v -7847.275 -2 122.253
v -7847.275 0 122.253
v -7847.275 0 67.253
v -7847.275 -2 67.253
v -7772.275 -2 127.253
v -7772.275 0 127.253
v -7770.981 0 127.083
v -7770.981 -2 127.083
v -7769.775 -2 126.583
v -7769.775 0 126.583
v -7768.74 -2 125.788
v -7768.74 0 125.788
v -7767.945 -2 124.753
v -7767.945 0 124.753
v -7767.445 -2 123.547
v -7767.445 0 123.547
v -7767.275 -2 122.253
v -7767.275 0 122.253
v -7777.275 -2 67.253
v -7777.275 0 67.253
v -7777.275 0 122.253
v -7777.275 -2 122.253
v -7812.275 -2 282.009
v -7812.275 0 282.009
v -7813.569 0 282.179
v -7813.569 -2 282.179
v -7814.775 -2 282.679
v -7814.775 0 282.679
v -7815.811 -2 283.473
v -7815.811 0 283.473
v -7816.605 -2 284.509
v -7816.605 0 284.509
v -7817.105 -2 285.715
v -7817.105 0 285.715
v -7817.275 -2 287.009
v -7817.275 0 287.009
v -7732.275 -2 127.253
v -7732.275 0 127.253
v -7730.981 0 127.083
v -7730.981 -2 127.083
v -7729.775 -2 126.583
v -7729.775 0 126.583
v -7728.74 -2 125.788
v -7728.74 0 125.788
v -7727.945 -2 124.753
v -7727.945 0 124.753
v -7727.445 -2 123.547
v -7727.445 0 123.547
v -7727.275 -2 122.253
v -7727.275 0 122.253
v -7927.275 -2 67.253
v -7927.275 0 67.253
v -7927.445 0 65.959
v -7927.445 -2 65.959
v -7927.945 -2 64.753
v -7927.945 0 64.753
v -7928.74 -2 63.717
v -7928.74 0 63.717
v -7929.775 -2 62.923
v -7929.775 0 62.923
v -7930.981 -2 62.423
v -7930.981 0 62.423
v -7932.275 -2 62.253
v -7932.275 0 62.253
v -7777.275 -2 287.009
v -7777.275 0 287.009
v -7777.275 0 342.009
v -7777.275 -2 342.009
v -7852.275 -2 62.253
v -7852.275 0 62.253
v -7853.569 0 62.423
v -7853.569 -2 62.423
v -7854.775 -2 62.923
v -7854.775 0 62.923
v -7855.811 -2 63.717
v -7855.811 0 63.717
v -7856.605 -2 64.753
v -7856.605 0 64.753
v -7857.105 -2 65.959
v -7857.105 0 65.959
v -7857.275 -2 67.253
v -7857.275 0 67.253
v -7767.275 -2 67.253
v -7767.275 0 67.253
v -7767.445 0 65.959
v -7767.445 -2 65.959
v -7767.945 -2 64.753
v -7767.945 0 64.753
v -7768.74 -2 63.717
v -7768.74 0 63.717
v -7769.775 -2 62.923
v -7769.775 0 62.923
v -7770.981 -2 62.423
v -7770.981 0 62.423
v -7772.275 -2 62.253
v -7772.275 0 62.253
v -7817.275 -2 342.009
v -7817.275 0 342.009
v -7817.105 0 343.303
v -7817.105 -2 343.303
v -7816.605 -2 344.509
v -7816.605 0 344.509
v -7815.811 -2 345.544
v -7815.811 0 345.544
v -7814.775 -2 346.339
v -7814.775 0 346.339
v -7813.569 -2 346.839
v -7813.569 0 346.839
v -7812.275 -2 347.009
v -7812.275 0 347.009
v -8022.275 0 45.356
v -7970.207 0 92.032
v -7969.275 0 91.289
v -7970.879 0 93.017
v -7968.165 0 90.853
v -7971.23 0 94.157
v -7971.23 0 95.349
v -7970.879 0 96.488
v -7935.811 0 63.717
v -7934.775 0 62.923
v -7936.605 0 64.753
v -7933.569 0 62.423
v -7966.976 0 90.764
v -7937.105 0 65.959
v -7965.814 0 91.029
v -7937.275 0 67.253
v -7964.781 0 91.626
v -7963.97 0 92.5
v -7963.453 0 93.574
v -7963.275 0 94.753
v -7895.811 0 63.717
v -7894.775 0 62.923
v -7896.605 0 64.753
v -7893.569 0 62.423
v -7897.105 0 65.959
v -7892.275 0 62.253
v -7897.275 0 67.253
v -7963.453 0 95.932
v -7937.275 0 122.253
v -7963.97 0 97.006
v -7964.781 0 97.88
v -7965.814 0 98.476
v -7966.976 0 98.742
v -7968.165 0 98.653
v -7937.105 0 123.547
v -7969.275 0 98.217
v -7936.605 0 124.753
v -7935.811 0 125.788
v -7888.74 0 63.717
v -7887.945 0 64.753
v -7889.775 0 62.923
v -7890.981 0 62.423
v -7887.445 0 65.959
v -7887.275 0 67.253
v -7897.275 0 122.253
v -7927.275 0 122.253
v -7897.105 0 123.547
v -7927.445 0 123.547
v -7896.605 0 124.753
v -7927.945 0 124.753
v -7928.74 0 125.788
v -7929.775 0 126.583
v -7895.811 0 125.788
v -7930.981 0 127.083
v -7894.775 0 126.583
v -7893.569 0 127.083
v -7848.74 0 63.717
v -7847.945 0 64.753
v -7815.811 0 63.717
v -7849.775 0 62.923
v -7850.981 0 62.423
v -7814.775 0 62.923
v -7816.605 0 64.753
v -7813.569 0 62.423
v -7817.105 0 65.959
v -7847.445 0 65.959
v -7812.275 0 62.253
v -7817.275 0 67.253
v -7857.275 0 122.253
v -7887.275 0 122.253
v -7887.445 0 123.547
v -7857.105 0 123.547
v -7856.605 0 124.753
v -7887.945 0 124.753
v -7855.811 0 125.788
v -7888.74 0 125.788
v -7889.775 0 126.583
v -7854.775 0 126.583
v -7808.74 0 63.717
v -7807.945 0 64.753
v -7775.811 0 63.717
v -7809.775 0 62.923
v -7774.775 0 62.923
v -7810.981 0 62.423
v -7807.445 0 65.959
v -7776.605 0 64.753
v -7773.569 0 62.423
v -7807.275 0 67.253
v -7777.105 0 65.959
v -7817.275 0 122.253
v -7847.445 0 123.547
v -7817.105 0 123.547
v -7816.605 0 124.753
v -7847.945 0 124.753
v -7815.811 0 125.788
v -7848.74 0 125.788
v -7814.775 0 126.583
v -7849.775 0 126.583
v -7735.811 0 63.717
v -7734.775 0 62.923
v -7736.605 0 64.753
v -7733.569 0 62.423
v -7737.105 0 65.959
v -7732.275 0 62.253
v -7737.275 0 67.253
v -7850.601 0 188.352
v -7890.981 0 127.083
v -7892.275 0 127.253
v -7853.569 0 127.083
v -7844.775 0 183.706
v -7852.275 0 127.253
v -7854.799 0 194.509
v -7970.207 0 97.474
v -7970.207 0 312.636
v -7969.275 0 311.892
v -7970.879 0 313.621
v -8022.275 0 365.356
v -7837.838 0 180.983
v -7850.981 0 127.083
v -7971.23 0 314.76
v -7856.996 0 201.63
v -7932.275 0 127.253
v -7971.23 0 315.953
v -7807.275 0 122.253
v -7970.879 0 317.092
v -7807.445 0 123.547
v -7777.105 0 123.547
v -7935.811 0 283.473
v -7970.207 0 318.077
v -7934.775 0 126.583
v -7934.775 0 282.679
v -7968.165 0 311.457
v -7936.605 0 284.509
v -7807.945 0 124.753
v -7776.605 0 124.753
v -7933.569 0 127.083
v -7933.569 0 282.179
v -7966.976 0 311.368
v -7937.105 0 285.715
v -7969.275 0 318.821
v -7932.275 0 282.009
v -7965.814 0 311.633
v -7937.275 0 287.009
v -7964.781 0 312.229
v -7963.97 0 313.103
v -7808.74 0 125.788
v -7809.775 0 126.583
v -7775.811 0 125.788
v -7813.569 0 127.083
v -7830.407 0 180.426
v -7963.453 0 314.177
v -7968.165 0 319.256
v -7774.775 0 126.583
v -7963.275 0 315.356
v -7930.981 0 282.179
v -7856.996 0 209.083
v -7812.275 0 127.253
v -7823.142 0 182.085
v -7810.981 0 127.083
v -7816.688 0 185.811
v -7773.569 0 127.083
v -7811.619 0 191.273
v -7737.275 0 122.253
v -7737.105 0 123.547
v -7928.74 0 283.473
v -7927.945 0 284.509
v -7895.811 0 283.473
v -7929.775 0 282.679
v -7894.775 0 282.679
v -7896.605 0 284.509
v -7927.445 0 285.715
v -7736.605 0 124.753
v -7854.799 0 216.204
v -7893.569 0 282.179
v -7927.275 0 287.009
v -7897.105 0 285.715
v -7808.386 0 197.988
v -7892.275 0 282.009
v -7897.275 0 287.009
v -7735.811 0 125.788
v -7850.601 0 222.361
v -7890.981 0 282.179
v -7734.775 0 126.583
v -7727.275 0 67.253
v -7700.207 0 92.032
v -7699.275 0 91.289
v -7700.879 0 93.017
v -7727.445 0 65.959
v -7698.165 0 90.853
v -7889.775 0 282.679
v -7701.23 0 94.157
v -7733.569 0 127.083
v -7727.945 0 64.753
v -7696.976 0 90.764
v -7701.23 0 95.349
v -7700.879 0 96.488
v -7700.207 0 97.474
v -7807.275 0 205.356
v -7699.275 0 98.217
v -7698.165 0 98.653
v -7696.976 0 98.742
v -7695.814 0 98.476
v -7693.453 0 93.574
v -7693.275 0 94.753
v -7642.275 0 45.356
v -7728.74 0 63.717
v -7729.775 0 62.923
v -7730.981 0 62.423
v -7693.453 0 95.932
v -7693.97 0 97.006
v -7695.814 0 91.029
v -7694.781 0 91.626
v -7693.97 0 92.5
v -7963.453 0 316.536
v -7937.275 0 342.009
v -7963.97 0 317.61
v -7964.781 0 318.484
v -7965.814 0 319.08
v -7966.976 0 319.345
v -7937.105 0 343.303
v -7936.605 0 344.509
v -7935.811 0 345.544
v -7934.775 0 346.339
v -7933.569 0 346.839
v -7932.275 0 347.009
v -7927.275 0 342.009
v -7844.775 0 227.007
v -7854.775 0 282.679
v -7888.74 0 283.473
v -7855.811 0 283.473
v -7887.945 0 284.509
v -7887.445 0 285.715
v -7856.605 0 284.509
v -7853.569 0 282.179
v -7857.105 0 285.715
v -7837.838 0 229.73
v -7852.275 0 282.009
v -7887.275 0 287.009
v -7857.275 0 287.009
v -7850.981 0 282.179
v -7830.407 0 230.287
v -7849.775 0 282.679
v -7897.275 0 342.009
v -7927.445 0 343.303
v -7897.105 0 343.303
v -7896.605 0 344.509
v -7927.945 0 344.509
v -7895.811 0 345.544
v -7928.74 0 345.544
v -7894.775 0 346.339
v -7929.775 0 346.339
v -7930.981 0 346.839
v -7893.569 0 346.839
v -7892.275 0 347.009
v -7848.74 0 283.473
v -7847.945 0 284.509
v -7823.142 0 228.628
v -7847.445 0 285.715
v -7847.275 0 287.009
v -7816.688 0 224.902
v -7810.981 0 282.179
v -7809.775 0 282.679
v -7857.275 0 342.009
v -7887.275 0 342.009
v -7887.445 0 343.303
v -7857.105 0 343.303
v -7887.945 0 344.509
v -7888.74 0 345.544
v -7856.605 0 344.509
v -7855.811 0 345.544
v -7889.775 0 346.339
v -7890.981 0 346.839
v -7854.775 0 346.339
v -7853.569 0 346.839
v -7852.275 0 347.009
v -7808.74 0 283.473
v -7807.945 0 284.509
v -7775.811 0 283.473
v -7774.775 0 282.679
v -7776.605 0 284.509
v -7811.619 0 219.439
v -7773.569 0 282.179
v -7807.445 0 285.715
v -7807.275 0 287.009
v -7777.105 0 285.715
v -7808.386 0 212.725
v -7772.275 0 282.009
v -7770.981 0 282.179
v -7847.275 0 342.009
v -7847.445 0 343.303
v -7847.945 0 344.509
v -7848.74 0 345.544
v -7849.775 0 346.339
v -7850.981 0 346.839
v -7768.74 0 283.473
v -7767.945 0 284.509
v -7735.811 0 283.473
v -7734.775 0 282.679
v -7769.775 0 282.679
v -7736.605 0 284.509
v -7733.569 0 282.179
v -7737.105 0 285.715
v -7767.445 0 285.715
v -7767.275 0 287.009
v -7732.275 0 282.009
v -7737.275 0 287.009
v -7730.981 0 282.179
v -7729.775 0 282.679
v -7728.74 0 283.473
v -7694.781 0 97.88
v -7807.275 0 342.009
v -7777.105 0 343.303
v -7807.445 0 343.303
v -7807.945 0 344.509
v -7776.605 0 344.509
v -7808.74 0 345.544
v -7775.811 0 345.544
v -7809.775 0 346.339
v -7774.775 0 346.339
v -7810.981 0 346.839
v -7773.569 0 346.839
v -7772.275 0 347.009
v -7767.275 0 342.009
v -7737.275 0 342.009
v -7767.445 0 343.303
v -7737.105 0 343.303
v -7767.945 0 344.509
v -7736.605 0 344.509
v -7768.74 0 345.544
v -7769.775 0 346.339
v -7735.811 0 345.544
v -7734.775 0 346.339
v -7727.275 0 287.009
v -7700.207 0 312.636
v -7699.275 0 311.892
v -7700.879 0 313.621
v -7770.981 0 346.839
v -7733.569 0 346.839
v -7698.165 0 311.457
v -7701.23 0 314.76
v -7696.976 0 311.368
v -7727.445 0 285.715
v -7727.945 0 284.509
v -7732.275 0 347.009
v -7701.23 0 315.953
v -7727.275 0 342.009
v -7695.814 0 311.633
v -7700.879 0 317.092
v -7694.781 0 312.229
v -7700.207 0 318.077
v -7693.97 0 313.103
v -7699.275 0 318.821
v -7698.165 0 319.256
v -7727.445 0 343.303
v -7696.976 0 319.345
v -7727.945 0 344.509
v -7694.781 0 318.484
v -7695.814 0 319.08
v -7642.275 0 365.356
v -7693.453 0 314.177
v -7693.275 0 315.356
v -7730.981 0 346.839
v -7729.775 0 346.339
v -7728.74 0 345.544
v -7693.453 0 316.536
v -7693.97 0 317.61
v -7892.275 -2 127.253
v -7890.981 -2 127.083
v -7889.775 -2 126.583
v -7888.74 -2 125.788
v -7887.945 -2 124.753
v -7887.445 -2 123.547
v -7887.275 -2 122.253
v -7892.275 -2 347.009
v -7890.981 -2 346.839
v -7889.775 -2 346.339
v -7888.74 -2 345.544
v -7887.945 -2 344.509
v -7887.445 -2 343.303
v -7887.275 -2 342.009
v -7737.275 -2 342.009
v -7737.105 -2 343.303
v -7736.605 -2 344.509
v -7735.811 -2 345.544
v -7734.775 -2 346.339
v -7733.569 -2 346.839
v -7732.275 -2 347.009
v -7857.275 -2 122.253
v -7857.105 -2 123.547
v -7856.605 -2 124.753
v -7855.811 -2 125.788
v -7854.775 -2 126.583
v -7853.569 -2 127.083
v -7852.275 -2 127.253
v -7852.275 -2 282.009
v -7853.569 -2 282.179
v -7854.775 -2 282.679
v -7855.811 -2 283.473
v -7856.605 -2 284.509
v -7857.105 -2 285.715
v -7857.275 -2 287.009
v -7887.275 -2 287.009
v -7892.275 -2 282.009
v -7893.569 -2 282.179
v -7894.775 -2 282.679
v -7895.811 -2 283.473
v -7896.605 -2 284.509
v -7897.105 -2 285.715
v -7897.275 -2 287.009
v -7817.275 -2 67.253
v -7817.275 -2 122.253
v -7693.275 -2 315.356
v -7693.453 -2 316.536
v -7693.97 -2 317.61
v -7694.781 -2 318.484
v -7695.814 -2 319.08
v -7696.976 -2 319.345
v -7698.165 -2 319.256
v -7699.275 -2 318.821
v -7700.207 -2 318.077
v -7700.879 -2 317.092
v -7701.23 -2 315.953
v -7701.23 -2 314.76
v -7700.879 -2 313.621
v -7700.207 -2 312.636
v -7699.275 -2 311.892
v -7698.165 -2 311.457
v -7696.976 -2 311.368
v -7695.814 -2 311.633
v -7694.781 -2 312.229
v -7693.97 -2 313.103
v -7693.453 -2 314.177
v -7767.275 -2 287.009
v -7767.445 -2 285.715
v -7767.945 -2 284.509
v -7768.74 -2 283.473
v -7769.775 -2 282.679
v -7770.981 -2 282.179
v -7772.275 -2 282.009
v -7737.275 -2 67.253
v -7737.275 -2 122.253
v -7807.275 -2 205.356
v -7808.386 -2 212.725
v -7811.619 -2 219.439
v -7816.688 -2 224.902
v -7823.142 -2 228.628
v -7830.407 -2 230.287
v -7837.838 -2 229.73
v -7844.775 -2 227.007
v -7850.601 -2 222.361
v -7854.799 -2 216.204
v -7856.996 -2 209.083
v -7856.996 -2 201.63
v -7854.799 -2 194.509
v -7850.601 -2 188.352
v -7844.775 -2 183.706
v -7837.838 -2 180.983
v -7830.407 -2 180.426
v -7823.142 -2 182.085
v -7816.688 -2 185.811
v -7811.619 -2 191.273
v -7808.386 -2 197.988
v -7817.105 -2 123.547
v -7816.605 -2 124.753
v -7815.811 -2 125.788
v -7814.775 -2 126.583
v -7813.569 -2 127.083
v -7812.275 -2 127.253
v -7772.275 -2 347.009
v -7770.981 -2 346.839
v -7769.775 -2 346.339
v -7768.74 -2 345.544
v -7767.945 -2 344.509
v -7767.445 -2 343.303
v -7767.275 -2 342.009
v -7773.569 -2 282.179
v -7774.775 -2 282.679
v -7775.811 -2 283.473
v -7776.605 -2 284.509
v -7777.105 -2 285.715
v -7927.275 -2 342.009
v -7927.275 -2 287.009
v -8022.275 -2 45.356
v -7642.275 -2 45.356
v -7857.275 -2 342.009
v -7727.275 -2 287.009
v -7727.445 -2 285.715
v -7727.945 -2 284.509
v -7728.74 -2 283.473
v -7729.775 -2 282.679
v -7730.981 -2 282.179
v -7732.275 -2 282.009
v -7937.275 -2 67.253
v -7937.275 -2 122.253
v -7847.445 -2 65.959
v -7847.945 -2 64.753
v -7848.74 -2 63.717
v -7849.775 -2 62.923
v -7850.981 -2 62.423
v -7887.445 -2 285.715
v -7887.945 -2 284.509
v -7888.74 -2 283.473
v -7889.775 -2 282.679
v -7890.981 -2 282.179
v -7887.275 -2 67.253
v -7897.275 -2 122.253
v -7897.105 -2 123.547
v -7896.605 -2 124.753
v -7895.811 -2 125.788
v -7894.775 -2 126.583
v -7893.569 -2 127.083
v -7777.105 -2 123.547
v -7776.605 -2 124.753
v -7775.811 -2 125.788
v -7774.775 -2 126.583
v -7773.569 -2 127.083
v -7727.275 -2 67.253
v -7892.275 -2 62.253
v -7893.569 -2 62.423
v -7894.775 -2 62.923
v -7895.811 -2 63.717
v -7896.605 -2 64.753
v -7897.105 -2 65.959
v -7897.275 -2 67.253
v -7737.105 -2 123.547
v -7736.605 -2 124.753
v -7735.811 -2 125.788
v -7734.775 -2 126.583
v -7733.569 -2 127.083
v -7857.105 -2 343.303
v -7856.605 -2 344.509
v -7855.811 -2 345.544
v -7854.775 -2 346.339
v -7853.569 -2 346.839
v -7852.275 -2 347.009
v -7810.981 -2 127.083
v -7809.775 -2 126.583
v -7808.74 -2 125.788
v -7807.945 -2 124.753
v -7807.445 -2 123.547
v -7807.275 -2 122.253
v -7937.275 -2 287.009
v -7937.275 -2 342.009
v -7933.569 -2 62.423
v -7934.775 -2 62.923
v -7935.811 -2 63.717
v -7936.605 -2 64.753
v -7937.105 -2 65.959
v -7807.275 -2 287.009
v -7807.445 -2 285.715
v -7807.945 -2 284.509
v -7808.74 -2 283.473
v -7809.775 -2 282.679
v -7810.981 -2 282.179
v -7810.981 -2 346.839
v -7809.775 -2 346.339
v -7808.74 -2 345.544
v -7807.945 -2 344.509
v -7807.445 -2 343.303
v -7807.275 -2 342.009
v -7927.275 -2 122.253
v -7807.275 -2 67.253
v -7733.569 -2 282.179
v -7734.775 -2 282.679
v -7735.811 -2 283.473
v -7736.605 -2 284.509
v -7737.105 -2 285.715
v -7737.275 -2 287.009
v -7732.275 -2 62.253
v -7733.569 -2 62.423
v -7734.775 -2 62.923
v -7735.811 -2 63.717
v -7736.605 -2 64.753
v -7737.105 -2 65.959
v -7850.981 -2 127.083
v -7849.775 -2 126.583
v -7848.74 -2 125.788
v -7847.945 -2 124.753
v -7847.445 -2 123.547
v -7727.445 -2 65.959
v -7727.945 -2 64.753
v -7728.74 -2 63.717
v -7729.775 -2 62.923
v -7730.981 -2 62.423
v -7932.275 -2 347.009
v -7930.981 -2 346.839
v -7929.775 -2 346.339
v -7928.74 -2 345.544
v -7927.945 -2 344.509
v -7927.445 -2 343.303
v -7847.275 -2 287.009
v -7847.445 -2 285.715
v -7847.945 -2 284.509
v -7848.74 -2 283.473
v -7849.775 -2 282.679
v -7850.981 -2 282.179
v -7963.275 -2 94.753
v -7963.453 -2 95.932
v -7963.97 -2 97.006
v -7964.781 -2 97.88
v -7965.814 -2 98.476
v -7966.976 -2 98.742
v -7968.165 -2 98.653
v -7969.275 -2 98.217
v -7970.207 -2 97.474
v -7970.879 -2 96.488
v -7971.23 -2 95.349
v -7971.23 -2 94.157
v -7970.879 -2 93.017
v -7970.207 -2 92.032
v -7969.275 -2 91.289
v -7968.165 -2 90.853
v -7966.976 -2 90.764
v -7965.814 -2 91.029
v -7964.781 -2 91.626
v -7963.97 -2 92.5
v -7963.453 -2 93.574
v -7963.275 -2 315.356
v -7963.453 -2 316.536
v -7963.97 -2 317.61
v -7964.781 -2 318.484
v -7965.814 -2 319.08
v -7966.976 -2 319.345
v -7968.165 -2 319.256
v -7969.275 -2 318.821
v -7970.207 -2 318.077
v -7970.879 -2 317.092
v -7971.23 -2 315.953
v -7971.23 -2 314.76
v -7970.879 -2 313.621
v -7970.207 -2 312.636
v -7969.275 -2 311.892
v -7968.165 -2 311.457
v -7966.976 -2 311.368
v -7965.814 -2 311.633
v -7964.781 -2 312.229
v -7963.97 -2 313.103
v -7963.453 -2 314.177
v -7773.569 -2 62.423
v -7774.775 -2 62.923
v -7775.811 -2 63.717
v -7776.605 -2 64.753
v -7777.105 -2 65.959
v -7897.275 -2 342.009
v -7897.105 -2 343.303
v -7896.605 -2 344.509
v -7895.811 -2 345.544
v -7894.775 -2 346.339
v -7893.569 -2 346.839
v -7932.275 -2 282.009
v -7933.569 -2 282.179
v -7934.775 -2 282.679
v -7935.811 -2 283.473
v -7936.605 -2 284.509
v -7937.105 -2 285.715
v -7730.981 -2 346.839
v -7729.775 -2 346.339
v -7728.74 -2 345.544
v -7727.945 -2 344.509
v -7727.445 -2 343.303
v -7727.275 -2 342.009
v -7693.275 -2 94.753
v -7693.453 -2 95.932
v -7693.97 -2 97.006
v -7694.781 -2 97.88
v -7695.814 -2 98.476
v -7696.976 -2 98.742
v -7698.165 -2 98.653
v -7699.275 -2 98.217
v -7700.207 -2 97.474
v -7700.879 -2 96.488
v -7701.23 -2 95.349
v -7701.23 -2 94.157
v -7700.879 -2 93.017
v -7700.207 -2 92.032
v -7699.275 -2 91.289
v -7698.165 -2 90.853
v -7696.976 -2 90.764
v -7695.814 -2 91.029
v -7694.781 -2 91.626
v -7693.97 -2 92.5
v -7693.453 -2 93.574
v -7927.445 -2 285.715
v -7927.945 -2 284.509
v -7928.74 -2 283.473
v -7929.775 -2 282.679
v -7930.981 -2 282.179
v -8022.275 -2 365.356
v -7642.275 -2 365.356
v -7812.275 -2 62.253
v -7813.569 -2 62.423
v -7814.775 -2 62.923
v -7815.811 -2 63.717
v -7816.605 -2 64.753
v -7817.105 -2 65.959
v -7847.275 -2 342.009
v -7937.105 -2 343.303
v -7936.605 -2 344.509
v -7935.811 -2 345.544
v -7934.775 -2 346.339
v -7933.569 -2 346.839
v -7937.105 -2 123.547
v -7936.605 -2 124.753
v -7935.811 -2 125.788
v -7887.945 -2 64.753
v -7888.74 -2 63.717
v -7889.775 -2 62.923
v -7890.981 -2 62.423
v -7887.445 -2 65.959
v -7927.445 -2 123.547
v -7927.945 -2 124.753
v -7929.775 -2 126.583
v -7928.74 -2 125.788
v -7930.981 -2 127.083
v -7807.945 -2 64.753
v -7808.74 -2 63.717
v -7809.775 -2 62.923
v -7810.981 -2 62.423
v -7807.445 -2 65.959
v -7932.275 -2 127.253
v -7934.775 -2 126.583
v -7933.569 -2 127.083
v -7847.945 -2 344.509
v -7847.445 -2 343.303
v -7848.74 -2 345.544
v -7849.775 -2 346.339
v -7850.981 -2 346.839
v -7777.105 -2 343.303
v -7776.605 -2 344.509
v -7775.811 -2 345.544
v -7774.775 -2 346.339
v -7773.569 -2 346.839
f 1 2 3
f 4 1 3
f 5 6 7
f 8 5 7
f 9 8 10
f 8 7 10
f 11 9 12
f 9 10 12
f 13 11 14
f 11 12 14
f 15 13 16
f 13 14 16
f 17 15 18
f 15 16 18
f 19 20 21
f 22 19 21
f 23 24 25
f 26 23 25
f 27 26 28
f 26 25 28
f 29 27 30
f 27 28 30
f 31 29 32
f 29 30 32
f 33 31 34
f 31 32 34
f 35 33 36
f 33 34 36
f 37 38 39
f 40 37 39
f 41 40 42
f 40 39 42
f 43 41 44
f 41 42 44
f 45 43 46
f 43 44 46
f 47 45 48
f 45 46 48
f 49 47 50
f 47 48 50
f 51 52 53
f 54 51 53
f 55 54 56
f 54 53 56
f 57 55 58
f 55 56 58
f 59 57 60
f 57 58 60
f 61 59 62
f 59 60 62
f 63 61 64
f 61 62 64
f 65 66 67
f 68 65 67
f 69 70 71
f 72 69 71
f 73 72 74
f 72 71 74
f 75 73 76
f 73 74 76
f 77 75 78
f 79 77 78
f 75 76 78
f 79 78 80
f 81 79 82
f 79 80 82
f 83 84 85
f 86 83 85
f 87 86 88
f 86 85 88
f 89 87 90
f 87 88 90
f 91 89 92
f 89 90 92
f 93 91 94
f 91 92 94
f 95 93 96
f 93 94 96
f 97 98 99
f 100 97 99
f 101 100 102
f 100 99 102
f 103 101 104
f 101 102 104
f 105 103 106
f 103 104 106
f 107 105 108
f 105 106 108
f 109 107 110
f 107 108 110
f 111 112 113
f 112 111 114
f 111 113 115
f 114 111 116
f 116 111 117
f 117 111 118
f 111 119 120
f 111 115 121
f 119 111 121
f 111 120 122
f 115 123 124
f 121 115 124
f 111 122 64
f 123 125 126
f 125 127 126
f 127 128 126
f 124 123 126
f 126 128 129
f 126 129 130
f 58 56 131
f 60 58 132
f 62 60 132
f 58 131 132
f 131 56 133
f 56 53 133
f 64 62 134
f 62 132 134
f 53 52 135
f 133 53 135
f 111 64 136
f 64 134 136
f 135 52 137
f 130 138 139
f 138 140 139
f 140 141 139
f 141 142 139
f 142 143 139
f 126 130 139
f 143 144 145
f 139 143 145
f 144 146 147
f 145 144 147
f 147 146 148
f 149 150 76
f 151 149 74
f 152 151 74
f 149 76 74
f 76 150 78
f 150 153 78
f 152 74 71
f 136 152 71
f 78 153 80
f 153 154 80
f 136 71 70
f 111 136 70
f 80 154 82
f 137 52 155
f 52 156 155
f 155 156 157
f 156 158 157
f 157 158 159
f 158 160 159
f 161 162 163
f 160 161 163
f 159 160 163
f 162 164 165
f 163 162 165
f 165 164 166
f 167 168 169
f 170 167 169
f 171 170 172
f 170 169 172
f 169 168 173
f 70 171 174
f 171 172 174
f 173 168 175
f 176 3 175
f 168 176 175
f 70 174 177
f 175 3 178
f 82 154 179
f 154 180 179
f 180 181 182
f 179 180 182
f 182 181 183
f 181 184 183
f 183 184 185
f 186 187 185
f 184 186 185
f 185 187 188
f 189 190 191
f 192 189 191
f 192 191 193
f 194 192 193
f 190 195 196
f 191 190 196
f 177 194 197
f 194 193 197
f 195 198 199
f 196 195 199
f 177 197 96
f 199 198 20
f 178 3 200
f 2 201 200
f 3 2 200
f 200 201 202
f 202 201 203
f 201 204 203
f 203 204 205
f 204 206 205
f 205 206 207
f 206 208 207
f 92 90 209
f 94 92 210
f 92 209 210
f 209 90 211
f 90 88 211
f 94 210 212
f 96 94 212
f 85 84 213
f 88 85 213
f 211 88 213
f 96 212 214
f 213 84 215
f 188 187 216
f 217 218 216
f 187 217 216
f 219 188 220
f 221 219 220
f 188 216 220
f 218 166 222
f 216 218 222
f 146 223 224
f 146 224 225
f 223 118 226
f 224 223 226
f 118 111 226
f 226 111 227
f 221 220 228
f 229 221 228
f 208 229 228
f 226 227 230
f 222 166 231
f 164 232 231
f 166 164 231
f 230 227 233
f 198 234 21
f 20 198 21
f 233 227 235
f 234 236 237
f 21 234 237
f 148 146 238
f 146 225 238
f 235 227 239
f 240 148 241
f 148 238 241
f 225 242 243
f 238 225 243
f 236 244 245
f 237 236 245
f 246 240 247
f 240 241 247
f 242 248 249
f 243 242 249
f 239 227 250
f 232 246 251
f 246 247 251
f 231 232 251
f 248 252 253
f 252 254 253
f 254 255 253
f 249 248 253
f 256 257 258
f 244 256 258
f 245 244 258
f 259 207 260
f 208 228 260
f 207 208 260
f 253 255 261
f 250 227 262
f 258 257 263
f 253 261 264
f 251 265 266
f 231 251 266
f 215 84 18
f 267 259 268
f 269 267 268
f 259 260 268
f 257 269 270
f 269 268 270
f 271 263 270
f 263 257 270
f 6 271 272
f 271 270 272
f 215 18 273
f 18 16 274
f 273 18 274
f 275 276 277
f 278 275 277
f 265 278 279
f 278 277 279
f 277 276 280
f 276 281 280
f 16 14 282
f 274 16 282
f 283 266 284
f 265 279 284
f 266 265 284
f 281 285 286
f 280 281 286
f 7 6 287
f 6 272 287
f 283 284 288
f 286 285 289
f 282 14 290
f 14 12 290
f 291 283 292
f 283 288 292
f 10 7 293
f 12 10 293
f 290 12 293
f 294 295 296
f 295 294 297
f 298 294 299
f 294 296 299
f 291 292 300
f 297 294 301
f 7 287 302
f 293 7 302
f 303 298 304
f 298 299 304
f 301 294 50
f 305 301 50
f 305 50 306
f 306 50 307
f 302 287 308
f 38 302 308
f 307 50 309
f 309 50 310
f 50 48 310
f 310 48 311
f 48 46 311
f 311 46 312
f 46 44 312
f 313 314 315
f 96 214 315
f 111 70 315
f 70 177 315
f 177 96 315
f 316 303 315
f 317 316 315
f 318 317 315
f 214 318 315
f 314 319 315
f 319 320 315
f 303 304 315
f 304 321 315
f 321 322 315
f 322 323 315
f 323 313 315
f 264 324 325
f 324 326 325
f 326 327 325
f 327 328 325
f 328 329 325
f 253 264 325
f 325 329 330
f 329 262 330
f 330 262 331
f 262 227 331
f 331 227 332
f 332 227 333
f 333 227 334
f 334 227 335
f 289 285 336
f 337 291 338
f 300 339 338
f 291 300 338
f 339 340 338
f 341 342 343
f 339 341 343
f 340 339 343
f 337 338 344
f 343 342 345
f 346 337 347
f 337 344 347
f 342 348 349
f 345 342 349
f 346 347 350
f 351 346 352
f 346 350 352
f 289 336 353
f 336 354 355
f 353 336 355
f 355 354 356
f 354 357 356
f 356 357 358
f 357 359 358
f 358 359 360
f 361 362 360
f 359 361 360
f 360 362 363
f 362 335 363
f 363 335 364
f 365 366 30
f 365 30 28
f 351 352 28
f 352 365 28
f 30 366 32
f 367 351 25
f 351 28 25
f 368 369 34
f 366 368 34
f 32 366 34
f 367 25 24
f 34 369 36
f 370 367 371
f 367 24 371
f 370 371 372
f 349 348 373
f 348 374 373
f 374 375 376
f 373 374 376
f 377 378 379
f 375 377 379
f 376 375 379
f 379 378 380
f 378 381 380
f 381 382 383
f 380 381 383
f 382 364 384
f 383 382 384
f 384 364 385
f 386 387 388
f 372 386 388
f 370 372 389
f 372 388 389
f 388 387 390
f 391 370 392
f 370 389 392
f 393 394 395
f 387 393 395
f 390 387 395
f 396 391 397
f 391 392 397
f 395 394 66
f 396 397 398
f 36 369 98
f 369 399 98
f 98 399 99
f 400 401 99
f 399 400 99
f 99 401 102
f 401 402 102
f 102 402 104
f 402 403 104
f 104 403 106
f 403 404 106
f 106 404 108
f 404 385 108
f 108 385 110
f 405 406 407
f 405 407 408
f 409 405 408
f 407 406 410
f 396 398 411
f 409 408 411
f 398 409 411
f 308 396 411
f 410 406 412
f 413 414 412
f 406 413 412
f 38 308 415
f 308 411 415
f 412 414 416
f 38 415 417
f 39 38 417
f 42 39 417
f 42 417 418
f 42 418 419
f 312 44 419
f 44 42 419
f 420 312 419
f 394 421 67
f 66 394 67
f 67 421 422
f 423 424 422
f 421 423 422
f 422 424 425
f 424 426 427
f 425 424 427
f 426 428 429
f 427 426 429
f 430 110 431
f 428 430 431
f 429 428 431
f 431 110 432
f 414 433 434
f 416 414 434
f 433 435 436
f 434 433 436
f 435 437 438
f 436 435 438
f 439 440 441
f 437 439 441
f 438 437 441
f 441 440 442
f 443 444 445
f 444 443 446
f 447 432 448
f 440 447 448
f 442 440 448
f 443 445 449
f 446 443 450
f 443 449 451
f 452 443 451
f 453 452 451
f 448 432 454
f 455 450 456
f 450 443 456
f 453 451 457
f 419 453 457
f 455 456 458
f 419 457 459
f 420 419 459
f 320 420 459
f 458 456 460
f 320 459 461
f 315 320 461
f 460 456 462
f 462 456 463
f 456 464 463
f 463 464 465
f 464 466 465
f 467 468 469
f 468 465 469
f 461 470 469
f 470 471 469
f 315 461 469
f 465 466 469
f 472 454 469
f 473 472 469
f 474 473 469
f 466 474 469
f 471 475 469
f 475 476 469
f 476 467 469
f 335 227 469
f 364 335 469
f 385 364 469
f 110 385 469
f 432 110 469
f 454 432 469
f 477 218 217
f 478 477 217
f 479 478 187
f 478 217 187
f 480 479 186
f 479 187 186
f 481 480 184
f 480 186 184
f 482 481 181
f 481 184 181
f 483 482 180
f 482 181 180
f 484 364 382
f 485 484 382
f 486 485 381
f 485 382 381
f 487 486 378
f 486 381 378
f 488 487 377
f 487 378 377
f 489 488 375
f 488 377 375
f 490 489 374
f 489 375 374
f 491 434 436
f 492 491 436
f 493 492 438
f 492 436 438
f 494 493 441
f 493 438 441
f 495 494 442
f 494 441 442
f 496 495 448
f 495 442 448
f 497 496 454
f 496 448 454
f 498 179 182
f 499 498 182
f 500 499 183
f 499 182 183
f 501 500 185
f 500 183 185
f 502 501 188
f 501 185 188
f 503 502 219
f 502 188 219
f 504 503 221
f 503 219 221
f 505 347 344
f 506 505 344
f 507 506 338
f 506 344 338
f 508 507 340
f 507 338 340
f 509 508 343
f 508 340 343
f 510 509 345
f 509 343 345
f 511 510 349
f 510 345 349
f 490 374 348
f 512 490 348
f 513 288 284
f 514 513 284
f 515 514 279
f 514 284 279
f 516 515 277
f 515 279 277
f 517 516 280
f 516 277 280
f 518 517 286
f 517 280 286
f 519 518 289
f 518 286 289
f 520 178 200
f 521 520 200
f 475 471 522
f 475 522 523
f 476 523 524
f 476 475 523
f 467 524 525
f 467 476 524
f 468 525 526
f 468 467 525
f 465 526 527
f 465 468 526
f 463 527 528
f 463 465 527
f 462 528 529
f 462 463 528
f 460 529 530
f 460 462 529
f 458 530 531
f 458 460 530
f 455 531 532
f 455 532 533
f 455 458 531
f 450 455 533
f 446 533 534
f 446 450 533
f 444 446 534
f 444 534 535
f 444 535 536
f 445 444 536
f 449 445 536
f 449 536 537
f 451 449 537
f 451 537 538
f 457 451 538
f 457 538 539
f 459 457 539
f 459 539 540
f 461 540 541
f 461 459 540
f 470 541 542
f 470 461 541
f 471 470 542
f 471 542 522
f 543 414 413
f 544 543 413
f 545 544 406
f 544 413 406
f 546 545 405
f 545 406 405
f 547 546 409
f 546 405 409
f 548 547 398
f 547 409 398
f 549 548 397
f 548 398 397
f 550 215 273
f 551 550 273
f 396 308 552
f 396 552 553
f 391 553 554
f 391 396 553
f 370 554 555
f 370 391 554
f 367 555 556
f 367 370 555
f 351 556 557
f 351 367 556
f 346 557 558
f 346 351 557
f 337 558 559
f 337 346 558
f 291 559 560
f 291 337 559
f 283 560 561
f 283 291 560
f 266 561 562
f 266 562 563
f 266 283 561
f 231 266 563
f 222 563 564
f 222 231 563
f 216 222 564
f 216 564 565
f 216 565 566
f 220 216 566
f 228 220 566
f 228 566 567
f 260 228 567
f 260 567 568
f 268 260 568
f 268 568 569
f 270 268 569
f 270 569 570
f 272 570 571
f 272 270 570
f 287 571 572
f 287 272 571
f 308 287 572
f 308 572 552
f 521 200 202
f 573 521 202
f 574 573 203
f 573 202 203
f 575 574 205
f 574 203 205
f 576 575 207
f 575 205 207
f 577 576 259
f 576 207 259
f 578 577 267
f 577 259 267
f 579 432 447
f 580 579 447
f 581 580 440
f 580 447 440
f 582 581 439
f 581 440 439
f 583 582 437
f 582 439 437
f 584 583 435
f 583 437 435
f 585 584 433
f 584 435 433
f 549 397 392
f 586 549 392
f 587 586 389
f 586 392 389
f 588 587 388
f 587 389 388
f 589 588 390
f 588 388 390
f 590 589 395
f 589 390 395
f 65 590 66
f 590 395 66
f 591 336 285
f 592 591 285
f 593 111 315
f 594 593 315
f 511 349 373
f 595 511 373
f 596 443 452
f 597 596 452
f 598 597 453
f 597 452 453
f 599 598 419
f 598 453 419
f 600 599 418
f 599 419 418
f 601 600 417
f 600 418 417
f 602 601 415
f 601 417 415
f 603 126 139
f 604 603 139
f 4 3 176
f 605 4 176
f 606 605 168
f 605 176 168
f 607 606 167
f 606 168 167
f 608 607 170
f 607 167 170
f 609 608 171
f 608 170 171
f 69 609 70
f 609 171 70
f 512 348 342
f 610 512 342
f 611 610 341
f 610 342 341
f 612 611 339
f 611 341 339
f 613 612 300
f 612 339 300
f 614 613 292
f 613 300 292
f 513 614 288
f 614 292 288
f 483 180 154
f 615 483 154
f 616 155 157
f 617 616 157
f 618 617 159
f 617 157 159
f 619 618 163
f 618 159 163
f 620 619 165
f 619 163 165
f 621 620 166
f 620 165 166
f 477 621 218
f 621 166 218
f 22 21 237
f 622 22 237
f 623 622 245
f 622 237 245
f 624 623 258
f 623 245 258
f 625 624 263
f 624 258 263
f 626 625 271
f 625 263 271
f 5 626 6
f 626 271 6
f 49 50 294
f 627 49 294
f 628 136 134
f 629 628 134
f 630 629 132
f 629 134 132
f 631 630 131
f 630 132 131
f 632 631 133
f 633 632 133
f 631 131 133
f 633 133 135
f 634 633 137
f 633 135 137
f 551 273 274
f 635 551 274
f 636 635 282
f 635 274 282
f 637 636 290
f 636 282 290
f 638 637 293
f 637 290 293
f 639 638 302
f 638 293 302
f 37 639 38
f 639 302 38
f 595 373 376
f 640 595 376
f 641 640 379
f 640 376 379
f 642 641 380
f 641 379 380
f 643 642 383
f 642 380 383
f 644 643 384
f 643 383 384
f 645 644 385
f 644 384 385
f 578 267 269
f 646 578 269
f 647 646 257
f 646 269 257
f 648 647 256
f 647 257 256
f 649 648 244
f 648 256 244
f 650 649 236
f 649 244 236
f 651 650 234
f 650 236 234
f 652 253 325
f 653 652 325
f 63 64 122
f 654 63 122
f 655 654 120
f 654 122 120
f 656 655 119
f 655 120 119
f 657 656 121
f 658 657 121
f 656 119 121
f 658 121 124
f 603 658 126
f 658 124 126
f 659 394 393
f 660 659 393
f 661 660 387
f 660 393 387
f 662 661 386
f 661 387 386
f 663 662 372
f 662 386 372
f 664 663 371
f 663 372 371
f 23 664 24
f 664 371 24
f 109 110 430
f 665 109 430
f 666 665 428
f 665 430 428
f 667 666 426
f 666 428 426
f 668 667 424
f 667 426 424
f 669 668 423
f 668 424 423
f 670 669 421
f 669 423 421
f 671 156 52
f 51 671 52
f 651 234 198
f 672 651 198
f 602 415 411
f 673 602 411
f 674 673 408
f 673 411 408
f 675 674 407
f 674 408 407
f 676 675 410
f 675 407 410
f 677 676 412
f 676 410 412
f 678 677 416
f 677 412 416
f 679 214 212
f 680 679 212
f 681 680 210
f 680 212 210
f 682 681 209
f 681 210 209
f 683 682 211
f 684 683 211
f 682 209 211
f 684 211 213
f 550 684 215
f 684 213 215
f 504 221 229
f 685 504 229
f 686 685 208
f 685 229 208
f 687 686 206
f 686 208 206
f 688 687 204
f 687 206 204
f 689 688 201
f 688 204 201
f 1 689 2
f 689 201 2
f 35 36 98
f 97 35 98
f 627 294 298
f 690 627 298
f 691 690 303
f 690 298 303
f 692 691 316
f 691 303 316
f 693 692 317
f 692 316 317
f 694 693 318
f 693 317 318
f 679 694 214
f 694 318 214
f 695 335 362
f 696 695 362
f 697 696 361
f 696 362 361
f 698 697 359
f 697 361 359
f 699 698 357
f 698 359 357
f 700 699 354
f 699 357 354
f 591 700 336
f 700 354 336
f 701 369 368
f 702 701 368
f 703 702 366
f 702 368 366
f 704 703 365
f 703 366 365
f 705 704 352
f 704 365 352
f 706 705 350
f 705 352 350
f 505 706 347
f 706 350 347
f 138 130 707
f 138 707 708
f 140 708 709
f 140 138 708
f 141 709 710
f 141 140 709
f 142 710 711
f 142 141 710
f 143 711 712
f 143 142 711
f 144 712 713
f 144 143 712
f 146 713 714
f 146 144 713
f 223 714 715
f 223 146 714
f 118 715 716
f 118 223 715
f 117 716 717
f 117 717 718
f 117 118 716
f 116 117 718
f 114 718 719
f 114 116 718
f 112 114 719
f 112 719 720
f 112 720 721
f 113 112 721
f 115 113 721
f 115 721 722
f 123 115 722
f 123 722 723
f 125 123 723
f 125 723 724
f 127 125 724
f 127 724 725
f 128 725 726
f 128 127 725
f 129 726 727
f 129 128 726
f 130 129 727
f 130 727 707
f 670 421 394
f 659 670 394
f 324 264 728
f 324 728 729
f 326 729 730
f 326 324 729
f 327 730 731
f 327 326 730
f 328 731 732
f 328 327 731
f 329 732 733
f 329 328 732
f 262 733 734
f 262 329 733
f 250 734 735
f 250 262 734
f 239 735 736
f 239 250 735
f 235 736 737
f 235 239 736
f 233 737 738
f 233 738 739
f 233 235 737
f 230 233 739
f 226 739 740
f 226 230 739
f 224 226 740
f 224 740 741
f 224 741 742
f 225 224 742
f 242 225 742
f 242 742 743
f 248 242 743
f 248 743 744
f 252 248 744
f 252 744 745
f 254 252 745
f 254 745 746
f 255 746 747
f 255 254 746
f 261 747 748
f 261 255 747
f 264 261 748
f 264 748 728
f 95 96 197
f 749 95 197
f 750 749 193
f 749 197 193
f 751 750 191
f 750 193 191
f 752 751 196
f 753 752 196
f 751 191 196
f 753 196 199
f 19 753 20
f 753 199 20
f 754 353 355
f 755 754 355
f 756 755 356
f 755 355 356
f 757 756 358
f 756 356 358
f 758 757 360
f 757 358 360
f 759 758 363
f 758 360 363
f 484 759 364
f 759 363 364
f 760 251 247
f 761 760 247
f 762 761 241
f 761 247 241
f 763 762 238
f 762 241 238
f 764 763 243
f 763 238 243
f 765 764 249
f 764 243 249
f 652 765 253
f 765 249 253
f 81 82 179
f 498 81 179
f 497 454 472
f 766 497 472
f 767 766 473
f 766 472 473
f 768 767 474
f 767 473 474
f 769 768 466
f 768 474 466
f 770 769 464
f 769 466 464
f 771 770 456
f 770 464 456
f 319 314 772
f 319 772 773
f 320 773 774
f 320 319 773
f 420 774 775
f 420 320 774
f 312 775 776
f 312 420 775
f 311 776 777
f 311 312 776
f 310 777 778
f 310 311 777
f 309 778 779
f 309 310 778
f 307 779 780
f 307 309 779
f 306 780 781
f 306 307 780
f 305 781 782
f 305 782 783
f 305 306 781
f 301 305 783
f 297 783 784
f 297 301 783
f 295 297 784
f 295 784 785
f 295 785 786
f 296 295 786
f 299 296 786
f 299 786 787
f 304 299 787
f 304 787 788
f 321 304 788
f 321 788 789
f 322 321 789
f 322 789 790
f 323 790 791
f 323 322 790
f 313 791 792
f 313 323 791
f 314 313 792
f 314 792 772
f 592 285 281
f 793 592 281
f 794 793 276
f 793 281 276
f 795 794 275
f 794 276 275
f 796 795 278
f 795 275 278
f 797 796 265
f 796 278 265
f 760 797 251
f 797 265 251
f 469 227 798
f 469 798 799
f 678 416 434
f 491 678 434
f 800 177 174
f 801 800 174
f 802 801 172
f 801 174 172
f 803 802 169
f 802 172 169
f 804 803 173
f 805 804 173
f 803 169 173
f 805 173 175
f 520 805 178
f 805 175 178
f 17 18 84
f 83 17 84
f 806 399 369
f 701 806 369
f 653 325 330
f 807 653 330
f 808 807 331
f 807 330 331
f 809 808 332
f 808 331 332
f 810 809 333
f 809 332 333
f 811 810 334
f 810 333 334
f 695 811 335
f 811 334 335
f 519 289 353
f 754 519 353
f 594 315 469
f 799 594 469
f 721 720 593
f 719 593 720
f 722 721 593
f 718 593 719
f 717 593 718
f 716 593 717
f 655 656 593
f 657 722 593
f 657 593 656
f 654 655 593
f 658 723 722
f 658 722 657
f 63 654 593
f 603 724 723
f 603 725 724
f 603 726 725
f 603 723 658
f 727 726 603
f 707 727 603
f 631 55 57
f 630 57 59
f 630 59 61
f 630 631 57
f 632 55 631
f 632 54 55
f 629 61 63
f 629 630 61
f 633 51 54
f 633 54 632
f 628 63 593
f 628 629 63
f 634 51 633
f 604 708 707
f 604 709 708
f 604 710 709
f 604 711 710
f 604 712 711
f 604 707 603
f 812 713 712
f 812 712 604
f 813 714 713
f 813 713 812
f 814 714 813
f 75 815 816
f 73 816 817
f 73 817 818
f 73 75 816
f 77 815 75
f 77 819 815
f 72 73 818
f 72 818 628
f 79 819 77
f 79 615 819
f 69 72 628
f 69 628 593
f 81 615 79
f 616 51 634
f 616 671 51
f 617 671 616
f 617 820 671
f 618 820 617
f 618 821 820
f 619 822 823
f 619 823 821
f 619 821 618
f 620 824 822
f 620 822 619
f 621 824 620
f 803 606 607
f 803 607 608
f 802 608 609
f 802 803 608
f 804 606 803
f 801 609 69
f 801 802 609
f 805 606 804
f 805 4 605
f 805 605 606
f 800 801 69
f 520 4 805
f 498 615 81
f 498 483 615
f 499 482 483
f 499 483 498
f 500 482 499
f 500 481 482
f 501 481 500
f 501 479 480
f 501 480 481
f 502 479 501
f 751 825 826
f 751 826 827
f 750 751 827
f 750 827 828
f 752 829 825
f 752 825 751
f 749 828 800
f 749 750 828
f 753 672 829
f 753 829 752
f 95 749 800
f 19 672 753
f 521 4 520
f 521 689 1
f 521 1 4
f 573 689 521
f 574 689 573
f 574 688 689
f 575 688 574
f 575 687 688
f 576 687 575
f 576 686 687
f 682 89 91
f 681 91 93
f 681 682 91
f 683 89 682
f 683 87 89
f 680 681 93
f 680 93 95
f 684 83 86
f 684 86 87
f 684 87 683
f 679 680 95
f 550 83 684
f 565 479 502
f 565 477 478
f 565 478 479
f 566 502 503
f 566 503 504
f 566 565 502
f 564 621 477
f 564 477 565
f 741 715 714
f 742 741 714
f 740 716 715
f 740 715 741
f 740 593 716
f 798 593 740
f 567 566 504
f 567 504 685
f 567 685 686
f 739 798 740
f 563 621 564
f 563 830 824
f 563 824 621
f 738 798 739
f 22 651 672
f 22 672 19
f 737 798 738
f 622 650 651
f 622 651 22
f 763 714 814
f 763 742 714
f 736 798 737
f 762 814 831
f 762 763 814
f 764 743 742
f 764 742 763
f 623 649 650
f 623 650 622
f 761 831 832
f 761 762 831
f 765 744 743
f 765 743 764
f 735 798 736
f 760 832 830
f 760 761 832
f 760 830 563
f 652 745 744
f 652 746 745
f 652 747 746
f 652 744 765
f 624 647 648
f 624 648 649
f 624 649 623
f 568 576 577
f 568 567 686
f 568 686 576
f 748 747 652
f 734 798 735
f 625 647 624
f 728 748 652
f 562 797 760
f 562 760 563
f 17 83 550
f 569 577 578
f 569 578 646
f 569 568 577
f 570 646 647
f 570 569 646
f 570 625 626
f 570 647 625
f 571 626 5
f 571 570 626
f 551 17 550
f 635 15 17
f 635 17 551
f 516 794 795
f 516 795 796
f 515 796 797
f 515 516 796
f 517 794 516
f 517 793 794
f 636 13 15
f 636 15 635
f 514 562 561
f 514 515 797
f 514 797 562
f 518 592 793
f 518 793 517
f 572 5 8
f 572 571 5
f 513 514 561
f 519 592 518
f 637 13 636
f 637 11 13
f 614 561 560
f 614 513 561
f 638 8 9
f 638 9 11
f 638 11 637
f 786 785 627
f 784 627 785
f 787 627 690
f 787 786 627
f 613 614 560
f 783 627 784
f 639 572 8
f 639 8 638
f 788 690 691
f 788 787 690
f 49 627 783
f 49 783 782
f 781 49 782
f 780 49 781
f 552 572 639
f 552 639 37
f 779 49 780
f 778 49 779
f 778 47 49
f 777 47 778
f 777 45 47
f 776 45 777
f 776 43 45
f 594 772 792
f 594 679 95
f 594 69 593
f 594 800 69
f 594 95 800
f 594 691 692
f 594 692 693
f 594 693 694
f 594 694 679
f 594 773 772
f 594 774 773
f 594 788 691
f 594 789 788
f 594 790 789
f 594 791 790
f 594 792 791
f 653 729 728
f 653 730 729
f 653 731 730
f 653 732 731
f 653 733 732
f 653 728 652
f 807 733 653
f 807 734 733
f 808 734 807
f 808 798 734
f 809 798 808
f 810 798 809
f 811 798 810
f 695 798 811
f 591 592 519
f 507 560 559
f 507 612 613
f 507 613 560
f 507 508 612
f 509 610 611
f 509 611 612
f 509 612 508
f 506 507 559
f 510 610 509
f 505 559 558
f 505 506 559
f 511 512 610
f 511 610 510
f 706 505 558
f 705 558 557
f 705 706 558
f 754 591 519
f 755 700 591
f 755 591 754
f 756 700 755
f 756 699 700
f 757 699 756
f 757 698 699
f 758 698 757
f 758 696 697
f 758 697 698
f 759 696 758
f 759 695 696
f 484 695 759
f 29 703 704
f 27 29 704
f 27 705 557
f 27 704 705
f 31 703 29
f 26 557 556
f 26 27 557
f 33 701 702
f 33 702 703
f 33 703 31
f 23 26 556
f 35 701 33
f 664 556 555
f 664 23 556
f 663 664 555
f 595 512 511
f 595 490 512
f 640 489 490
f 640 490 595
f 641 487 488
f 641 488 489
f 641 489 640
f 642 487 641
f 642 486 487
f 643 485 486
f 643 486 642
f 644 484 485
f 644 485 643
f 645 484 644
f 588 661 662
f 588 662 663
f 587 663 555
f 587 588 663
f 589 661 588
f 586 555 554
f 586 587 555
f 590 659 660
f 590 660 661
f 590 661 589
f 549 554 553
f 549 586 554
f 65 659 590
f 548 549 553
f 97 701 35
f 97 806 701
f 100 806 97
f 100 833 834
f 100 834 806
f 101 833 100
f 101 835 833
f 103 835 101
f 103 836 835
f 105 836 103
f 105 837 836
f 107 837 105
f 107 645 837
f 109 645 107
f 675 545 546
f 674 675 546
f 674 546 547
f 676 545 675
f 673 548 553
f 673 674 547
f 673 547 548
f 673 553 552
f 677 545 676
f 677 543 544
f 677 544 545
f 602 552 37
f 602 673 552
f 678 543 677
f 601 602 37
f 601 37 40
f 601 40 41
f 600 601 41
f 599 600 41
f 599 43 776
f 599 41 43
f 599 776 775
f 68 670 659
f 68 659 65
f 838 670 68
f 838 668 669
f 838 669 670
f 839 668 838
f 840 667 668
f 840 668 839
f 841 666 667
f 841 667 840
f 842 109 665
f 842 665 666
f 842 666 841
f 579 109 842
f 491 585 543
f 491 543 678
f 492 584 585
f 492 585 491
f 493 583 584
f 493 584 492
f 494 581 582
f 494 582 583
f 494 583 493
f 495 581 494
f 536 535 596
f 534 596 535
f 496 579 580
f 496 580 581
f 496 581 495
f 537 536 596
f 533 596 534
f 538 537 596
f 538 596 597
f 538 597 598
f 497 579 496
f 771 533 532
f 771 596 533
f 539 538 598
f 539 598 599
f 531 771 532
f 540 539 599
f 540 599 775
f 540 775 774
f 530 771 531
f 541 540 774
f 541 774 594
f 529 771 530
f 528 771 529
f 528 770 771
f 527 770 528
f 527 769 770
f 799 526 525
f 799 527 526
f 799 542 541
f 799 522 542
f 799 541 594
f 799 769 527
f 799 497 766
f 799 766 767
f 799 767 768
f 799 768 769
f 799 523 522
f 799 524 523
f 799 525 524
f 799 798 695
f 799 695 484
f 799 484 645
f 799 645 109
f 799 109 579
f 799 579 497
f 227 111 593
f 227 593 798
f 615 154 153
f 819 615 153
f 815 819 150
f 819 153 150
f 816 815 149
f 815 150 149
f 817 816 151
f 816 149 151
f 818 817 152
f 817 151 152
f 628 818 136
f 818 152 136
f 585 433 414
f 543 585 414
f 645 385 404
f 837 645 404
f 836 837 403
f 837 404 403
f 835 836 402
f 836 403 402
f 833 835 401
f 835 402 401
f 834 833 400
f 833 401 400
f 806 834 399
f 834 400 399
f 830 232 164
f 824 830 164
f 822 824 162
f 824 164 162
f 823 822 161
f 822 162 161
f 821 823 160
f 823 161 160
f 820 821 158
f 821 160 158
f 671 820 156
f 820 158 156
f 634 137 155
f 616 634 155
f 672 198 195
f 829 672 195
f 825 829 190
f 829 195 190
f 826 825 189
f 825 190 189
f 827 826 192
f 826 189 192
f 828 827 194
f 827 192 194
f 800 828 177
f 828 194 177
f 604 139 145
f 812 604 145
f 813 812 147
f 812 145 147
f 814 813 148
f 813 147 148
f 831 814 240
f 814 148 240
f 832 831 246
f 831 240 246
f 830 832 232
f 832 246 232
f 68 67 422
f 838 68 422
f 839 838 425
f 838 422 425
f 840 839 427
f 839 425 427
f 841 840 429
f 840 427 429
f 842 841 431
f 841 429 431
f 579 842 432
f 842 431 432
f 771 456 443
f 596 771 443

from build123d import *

# Parameters (mm, degrees)
F0_W     = 380
F0_H     = 320
F0_R     = 4
F0_R_2   = 25
F1_DEPTH = 2


with BuildPart() as f1:
    # F0 (on Front) → F1 (new body)
    with BuildSketch(Plane.XZ):
        with Locations((-7832.275127, 205.356488)):
            Rectangle(F0_W, F0_H)
        with Locations((-7967.275127, 94.752941)):
            Circle(F0_R, mode=Mode.SUBTRACT)
        with BuildLine():
            ThreePointArc((-7932.275127, 127.252941), (-7928.739593, 125.788475), (-7927.275127, 122.252941))
            Line((-7927.275127, 122.252941), (-7927.275127, 67.252941))
            ThreePointArc((-7927.275127, 67.252941), (-7928.739593, 63.717407), (-7932.275127, 62.252941))
            ThreePointArc((-7932.275127, 62.252941), (-7935.810661, 63.717407), (-7937.275127, 67.252941))
            Line((-7937.275127, 67.252941), (-7937.275127, 122.252941))
            ThreePointArc((-7937.275127, 122.252941), (-7935.810661, 125.788475), (-7932.275127, 127.252941))
        make_face(mode=Mode.SUBTRACT)
        with BuildLine():
            ThreePointArc((-7892.275127, 127.252941), (-7888.739593, 125.788475), (-7887.275127, 122.252941))
            Line((-7887.275127, 122.252941), (-7887.275127, 67.252941))
            ThreePointArc((-7887.275127, 67.252941), (-7888.739593, 63.717407), (-7892.275127, 62.252941))
            ThreePointArc((-7892.275127, 62.252941), (-7895.810661, 63.717407), (-7897.275127, 67.252941))
            Line((-7897.275127, 67.252941), (-7897.275127, 122.252941))
            ThreePointArc((-7897.275127, 122.252941), (-7895.810661, 125.788475), (-7892.275127, 127.252941))
        make_face(mode=Mode.SUBTRACT)
        with BuildLine():
            ThreePointArc((-7852.275127, 127.252941), (-7848.739593, 125.788475), (-7847.275127, 122.252941))
            Line((-7847.275127, 122.252941), (-7847.275127, 67.252941))
            ThreePointArc((-7847.275127, 67.252941), (-7848.739593, 63.717407), (-7852.275127, 62.252941))
            ThreePointArc((-7852.275127, 62.252941), (-7855.810661, 63.717407), (-7857.275127, 67.252941))
            Line((-7857.275127, 67.252941), (-7857.275127, 122.252941))
            ThreePointArc((-7857.275127, 122.252941), (-7855.810661, 125.788475), (-7852.275127, 127.252941))
        make_face(mode=Mode.SUBTRACT)
        with BuildLine():
            ThreePointArc((-7812.275127, 127.252941), (-7808.739593, 125.788475), (-7807.275127, 122.252941))
            Line((-7807.275127, 122.252941), (-7807.275127, 67.252941))
            ThreePointArc((-7807.275127, 67.252941), (-7808.739593, 63.717407), (-7812.275127, 62.252941))
            ThreePointArc((-7812.275127, 62.252941), (-7815.810661, 63.717407), (-7817.275127, 67.252941))
            Line((-7817.275127, 67.252941), (-7817.275127, 122.252941))
            ThreePointArc((-7817.275127, 122.252941), (-7815.810661, 125.788475), (-7812.275127, 127.252941))
        make_face(mode=Mode.SUBTRACT)
        with BuildLine():
            ThreePointArc((-7772.275127, 127.252941), (-7768.739593, 125.788475), (-7767.275127, 122.252941))
            Line((-7767.275127, 122.252941), (-7767.275127, 67.252941))
            ThreePointArc((-7767.275127, 67.252941), (-7768.739593, 63.717407), (-7772.275127, 62.252941))
            ThreePointArc((-7772.275127, 62.252941), (-7775.810661, 63.717407), (-7777.275127, 67.252941))
            Line((-7777.275127, 67.252941), (-7777.275127, 122.252941))
            ThreePointArc((-7777.275127, 122.252941), (-7775.810661, 125.788475), (-7772.275127, 127.252941))
        make_face(mode=Mode.SUBTRACT)
        with BuildLine():
            ThreePointArc((-7732.275127, 127.252941), (-7728.739593, 125.788475), (-7727.275127, 122.252941))
            Line((-7727.275127, 122.252941), (-7727.275127, 67.252941))
            ThreePointArc((-7727.275127, 67.252941), (-7728.739593, 63.717407), (-7732.275127, 62.252941))
            ThreePointArc((-7732.275127, 62.252941), (-7735.810661, 63.717407), (-7737.275127, 67.252941))
            Line((-7737.275127, 67.252941), (-7737.275127, 122.252941))
            ThreePointArc((-7737.275127, 122.252941), (-7735.810661, 125.788475), (-7732.275127, 127.252941))
        make_face(mode=Mode.SUBTRACT)
        with Locations((-7697.275127, 94.752941)):
            Circle(F0_R, mode=Mode.SUBTRACT)
        with Locations((-7832.275127, 205.356488)):
            Circle(F0_R_2, mode=Mode.SUBTRACT)
        with Locations((-7967.275127, 315.356488)):
            Circle(F0_R, mode=Mode.SUBTRACT)
        with BuildLine():
            ThreePointArc((-7932.275127, 347.008945), (-7928.739593, 345.544479), (-7927.275127, 342.008945))
            Line((-7927.275127, 342.008945), (-7927.275127, 287.008945))
            ThreePointArc((-7927.275127, 287.008945), (-7928.739593, 283.473411), (-7932.275127, 282.008945))
            ThreePointArc((-7932.275127, 282.008945), (-7935.810661, 283.473411), (-7937.275127, 287.008945))
            Line((-7937.275127, 287.008945), (-7937.275127, 342.008945))
            ThreePointArc((-7937.275127, 342.008945), (-7935.810661, 345.544479), (-7932.275127, 347.008945))
        make_face(mode=Mode.SUBTRACT)
        with BuildLine():
            ThreePointArc((-7892.275127, 347.008945), (-7888.739593, 345.544479), (-7887.275127, 342.008945))
            Line((-7887.275127, 342.008945), (-7887.275127, 287.008945))
            ThreePointArc((-7887.275127, 287.008945), (-7888.739593, 283.473411), (-7892.275127, 282.008945))
            ThreePointArc((-7892.275127, 282.008945), (-7895.810661, 283.473411), (-7897.275127, 287.008945))
            Line((-7897.275127, 287.008945), (-7897.275127, 342.008945))
            ThreePointArc((-7897.275127, 342.008945), (-7895.810661, 345.544479), (-7892.275127, 347.008945))
        make_face(mode=Mode.SUBTRACT)
        with BuildLine():
            ThreePointArc((-7852.275127, 347.008945), (-7848.739593, 345.544479), (-7847.275127, 342.008945))
            Line((-7847.275127, 342.008945), (-7847.275127, 287.008945))
            ThreePointArc((-7847.275127, 287.008945), (-7848.739593, 283.473411), (-7852.275127, 282.008945))
            ThreePointArc((-7852.275127, 282.008945), (-7855.810661, 283.473411), (-7857.275127, 287.008945))
            Line((-7857.275127, 287.008945), (-7857.275127, 342.008945))
            ThreePointArc((-7857.275127, 342.008945), (-7855.810661, 345.544479), (-7852.275127, 347.008945))
        make_face(mode=Mode.SUBTRACT)
        with BuildLine():
            ThreePointArc((-7812.275127, 347.008945), (-7808.739593, 345.544479), (-7807.275127, 342.008945))
            Line((-7807.275127, 342.008945), (-7807.275127, 287.008945))
            ThreePointArc((-7807.275127, 287.008945), (-7808.739593, 283.473411), (-7812.275127, 282.008945))
            ThreePointArc((-7812.275127, 282.008945), (-7815.810661, 283.473411), (-7817.275127, 287.008945))
            Line((-7817.275127, 287.008945), (-7817.275127, 342.008945))
            ThreePointArc((-7817.275127, 342.008945), (-7815.810661, 345.544479), (-7812.275127, 347.008945))
        make_face(mode=Mode.SUBTRACT)
        with BuildLine():
            ThreePointArc((-7772.275127, 347.008945), (-7768.739593, 345.544479), (-7767.275127, 342.008945))
            Line((-7767.275127, 342.008945), (-7767.275127, 287.008945))
            ThreePointArc((-7767.275127, 287.008945), (-7768.739593, 283.473411), (-7772.275127, 282.008945))
            ThreePointArc((-7772.275127, 282.008945), (-7775.810661, 283.473411), (-7777.275127, 287.008945))
            Line((-7777.275127, 287.008945), (-7777.275127, 342.008945))
            ThreePointArc((-7777.275127, 342.008945), (-7775.810661, 345.544479), (-7772.275127, 347.008945))
        make_face(mode=Mode.SUBTRACT)
        with BuildLine():
            ThreePointArc((-7732.275127, 347.008945), (-7728.739593, 345.544479), (-7727.275127, 342.008945))
            Line((-7727.275127, 342.008945), (-7727.275127, 287.008945))
            ThreePointArc((-7727.275127, 287.008945), (-7728.739593, 283.473411), (-7732.275127, 282.008945))
            ThreePointArc((-7732.275127, 282.008945), (-7735.810661, 283.473411), (-7737.275127, 287.008945))
            Line((-7737.275127, 287.008945), (-7737.275127, 342.008945))
            ThreePointArc((-7737.275127, 342.008945), (-7735.810661, 345.544479), (-7732.275127, 347.008945))
        make_face(mode=Mode.SUBTRACT)
        with Locations((-7697.275127, 315.356488)):
            Circle(F0_R, mode=Mode.SUBTRACT)
    extrude(amount=F1_DEPTH)


solid = f1.part
